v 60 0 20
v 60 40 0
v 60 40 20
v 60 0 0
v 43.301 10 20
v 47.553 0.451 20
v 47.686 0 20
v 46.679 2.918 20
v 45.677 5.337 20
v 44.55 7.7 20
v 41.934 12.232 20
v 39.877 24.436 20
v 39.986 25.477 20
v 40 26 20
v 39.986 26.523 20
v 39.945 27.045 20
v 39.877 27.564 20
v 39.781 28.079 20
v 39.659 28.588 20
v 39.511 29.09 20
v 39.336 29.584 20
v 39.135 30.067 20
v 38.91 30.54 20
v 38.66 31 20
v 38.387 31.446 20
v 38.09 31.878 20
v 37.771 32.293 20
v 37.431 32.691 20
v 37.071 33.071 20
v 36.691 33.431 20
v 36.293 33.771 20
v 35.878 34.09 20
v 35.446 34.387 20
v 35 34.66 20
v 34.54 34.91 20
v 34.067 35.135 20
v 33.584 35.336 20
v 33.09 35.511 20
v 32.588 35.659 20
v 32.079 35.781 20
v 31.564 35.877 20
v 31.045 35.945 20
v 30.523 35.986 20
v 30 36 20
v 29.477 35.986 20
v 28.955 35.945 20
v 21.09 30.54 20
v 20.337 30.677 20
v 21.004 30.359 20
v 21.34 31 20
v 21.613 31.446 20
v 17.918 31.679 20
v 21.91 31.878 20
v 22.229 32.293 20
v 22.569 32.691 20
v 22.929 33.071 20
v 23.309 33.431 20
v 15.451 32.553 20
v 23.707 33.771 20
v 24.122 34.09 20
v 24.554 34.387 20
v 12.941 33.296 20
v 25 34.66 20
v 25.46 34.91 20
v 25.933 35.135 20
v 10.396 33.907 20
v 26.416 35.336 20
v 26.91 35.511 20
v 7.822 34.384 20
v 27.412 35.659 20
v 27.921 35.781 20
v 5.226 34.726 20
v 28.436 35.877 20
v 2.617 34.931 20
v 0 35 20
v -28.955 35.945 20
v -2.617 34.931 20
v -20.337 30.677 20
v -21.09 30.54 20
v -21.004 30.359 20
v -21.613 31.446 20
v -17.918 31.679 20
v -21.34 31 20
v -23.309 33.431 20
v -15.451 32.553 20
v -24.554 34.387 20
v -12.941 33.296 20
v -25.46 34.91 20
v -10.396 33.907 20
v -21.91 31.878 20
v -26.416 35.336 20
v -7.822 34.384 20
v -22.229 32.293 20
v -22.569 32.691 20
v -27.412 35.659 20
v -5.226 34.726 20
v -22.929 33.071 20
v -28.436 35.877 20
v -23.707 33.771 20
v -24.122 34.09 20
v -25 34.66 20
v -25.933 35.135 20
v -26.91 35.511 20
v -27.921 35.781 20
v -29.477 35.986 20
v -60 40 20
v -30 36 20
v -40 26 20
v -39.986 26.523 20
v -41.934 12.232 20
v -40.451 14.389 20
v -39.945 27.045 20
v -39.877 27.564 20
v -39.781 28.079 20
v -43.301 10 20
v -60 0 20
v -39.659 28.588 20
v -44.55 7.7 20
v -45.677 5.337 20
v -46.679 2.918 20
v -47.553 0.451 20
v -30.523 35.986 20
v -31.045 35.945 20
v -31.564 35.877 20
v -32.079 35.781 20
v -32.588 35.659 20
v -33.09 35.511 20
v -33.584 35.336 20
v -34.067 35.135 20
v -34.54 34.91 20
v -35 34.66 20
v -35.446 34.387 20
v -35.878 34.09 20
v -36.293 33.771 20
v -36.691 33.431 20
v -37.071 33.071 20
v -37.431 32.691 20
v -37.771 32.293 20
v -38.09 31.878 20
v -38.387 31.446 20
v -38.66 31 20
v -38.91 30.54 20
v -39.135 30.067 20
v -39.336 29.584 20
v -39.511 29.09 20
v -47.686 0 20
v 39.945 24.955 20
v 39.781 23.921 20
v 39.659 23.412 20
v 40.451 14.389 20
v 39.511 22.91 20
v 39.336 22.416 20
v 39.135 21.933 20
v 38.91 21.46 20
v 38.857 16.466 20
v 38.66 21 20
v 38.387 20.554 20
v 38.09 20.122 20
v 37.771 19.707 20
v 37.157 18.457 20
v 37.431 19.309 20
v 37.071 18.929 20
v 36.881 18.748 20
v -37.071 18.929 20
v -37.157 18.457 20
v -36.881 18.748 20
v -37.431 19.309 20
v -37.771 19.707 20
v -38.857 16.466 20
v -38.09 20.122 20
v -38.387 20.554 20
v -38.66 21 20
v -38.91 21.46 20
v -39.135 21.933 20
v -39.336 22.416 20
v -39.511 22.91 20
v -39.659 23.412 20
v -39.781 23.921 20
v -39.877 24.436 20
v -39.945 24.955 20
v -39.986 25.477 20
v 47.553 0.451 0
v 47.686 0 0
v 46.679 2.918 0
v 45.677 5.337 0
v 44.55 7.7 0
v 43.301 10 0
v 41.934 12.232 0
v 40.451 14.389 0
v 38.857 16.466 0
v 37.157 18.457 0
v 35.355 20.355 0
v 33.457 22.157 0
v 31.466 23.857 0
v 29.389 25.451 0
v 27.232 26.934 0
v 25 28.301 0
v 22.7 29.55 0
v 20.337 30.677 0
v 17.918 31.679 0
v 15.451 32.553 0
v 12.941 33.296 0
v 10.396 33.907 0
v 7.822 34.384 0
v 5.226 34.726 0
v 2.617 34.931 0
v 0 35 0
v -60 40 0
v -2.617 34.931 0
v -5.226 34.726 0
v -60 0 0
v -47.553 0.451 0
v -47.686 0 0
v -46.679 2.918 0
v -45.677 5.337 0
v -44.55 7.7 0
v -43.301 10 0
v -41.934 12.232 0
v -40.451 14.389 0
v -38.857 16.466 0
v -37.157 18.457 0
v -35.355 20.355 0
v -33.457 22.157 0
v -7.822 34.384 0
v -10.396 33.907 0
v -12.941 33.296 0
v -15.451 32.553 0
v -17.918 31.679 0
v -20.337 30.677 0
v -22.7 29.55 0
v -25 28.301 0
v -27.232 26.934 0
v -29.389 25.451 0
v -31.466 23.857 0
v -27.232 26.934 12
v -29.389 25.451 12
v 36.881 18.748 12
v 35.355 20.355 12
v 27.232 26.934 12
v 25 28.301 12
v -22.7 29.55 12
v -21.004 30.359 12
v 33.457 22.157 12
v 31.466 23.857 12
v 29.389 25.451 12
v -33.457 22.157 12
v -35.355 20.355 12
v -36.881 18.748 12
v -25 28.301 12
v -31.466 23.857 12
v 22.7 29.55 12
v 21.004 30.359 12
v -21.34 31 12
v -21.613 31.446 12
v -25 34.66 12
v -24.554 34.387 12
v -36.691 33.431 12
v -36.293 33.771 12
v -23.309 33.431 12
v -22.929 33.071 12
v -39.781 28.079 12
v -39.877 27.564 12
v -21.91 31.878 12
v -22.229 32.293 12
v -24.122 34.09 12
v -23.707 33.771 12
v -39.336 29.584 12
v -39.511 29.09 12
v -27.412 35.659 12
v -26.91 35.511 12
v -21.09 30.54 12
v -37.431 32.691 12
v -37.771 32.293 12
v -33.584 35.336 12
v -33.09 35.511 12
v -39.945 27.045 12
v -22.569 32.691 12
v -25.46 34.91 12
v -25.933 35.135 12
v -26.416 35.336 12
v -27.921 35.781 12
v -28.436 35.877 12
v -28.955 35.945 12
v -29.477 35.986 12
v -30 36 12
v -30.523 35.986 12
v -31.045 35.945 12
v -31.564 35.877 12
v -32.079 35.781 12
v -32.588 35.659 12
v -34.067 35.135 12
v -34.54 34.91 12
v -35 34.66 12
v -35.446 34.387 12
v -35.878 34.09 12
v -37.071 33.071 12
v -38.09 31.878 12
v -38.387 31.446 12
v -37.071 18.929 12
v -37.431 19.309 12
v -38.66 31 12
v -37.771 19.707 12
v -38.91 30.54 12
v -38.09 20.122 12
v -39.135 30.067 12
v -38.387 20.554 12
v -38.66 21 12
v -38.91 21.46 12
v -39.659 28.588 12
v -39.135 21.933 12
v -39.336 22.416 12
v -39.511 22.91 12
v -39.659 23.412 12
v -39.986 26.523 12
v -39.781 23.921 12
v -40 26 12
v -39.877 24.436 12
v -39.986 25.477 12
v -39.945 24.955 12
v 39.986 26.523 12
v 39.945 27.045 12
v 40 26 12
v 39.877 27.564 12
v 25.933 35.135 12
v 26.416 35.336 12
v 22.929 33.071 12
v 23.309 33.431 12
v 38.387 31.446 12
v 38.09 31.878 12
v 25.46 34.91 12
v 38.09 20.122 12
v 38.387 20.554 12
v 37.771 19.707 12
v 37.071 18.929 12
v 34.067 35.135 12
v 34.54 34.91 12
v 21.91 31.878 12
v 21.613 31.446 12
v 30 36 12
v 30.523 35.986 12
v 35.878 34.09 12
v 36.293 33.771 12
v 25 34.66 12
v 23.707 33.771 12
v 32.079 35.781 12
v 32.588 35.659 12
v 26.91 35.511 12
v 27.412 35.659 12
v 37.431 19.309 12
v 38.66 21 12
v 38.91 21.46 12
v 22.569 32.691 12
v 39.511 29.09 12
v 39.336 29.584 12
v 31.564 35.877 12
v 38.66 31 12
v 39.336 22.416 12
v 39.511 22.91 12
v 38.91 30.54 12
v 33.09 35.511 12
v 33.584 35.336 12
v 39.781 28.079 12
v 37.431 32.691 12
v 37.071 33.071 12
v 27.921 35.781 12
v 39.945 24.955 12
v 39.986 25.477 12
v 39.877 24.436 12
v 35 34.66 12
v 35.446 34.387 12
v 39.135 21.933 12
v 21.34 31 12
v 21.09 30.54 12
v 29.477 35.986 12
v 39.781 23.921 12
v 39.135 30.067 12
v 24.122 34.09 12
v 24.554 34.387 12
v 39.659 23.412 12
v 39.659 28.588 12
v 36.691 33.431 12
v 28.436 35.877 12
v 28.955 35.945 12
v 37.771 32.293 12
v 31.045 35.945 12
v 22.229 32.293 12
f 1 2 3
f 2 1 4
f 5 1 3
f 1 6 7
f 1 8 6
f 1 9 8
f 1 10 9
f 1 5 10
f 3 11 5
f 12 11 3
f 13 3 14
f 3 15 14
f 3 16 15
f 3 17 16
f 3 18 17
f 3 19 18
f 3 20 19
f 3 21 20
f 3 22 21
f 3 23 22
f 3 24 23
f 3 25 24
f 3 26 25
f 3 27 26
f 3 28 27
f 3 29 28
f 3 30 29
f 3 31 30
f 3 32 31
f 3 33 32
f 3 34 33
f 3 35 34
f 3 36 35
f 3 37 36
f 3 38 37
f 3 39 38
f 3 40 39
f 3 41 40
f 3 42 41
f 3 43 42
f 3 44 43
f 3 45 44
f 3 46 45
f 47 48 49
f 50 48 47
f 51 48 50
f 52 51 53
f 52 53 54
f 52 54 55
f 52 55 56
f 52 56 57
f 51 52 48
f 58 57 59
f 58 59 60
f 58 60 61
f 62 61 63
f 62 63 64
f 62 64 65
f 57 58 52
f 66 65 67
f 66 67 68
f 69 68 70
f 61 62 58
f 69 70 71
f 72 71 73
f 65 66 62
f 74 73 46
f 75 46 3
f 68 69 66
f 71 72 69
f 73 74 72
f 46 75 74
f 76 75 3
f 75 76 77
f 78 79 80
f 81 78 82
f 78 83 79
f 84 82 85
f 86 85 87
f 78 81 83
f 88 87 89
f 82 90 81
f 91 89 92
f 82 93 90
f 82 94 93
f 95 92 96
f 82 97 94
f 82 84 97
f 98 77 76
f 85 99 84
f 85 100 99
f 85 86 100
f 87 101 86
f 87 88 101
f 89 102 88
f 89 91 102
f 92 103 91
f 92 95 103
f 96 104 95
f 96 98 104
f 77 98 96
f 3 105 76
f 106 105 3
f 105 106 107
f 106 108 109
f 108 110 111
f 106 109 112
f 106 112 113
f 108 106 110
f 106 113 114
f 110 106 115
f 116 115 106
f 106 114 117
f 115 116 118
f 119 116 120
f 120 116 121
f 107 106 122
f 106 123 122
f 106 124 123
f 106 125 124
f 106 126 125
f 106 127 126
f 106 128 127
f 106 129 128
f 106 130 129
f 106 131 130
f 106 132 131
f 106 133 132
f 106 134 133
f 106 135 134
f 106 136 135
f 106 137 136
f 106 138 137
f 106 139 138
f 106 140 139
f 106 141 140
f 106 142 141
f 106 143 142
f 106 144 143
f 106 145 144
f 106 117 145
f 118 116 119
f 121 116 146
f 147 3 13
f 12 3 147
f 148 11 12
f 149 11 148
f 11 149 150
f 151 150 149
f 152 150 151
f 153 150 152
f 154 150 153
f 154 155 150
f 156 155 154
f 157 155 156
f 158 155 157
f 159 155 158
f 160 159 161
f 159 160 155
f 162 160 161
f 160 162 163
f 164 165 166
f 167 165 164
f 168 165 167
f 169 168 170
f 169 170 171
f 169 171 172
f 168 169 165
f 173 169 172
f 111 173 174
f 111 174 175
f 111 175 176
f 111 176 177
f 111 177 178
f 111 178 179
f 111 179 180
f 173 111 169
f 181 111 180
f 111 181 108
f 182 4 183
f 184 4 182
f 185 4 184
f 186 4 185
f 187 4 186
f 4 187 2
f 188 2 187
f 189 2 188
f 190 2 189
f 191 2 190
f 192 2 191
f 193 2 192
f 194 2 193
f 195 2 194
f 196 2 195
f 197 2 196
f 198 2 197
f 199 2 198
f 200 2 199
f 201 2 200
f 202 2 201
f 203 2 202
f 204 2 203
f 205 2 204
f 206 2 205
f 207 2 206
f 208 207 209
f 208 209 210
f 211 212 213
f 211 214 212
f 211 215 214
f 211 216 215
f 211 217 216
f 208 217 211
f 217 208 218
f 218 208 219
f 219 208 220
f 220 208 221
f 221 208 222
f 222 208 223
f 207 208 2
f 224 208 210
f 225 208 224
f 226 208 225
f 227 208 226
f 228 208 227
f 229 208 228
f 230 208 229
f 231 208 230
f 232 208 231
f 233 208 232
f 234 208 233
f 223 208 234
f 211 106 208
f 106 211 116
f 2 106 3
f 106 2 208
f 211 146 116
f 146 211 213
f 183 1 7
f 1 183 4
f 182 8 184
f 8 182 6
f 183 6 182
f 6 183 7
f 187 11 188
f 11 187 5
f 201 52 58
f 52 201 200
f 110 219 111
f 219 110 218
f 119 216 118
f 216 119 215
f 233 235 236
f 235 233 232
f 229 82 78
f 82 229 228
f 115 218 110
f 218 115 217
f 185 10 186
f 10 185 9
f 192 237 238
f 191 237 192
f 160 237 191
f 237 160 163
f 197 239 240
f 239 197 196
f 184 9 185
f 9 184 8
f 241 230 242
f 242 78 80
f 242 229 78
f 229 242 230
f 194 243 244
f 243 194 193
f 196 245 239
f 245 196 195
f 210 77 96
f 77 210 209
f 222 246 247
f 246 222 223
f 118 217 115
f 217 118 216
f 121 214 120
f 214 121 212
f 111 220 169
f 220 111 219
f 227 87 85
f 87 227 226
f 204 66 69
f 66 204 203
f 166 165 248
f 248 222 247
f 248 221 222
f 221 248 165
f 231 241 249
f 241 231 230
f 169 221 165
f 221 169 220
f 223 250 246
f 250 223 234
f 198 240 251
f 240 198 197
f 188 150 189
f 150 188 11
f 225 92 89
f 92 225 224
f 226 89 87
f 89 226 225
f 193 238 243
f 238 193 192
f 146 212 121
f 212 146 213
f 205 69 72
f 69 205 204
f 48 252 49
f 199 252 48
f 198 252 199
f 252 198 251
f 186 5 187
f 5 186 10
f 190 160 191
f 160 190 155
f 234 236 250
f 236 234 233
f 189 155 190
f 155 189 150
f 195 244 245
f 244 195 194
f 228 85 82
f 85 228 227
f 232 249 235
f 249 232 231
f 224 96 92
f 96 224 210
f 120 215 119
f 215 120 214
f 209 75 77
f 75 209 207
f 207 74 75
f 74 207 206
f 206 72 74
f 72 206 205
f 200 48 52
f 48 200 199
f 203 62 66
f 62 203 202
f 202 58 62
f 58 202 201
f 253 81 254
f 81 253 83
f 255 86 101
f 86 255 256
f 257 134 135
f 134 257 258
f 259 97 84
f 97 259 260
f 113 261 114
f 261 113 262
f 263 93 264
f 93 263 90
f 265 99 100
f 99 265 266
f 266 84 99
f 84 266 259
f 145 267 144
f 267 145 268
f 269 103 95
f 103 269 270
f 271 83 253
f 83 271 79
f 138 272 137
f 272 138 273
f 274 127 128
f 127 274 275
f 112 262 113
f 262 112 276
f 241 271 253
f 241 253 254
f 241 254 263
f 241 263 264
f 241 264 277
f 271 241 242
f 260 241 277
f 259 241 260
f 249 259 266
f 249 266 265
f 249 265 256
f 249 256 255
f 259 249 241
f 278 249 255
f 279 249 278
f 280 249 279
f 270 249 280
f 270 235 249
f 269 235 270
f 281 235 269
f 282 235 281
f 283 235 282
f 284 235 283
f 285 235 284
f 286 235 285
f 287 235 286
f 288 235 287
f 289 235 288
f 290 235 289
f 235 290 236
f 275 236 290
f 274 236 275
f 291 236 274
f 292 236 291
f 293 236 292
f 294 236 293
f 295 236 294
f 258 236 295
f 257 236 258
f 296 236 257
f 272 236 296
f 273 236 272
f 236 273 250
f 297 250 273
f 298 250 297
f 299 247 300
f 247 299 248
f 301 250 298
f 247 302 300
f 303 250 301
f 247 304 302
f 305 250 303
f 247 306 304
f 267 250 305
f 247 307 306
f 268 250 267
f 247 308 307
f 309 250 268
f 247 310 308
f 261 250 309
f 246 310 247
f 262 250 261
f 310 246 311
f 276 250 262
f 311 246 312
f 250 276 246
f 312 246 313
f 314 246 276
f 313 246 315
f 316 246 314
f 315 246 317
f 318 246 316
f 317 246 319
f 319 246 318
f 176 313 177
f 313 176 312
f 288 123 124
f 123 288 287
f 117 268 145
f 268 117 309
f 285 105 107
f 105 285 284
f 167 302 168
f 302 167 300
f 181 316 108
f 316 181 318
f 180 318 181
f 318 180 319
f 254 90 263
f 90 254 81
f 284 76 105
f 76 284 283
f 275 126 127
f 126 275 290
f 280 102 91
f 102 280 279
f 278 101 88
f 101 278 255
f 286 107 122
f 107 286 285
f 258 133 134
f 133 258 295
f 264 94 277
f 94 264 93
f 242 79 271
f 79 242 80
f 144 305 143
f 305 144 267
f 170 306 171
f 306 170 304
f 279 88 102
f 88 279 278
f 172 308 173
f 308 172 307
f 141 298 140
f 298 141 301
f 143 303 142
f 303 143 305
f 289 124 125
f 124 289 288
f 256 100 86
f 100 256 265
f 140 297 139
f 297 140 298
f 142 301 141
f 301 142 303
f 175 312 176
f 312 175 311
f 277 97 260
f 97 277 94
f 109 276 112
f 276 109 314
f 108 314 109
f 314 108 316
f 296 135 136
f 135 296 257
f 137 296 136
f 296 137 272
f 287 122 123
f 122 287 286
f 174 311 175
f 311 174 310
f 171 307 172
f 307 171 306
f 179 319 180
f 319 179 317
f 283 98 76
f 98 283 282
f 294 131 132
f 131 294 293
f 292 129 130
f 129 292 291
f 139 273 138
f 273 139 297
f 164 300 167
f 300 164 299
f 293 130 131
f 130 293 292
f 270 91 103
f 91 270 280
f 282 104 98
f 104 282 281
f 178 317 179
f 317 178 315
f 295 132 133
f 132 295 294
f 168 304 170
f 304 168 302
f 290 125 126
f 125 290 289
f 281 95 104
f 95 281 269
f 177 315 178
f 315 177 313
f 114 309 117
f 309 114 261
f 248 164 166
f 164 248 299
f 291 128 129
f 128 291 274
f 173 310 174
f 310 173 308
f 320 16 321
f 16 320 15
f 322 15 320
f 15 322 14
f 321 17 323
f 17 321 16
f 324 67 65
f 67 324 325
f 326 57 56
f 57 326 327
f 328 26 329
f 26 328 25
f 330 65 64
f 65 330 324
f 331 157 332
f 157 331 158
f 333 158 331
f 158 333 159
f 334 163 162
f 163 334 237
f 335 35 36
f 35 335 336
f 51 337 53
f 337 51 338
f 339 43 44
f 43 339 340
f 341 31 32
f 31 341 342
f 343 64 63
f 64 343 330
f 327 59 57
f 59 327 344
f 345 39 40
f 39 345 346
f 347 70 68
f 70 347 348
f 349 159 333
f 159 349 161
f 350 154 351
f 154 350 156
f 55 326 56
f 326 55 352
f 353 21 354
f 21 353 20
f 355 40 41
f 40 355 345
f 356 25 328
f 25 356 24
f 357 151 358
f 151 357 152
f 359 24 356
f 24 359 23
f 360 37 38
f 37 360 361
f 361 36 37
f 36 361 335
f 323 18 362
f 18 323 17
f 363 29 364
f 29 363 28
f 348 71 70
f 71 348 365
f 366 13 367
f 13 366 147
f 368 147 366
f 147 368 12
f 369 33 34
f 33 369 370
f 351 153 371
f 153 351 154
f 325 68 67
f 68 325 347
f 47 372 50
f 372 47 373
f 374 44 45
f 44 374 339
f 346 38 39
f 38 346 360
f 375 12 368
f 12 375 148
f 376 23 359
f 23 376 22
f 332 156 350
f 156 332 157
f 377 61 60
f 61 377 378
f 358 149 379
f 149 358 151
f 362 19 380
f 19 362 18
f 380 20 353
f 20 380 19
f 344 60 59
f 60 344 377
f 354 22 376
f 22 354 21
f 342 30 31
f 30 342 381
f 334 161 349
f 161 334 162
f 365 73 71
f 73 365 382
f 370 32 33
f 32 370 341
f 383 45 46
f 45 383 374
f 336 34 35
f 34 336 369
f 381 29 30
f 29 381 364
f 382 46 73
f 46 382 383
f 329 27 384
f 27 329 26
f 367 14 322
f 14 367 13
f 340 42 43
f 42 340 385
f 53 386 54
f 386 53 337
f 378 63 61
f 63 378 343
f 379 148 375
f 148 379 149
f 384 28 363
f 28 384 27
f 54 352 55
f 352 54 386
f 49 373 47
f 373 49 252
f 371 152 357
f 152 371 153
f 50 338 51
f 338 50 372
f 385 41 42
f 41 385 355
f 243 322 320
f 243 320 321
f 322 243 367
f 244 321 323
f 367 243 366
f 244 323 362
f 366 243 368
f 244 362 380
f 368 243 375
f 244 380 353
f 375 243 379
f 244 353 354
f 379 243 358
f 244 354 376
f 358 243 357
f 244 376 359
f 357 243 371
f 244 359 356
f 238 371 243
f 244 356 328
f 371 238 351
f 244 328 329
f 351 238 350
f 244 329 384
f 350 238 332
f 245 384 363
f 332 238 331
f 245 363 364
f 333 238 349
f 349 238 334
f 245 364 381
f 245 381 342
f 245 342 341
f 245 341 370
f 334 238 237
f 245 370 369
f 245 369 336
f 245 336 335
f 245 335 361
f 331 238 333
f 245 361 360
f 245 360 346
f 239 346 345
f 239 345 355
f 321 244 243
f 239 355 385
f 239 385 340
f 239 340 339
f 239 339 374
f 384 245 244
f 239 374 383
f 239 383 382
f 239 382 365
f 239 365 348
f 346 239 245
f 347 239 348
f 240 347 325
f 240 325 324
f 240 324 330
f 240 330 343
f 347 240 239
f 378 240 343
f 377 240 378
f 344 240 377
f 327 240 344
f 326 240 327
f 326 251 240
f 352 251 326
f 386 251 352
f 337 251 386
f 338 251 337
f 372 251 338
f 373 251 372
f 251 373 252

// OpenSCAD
// Parametric dimensions for the arched bridge model
part_length = 120;         // Total length of the main body
part_height = 40;          // Total height of the main body
part_depth = 20;           // Thickness (extrusion depth) of the main body

arch_radius = 50;          // Radius of the lower arched void
arch_y_offset = -15;       // Vertical drop of the arch center to leave straight vertical ends

recess_radius = 10;        // Radius of the circular material removals
recess_depth = 8;          // Depth of the recesses (shallower than part_depth)
recess_spacing = 60;       // Center-to-center distance between the paired recesses
recess_y_pos = 26;         // Vertical position of the recesses (upper side of the body)

$fn = 120;                 // High resolution for smooth curved surfaces

// Module defining the main extrusion profile with the bottom arch
module arched_body(len, hgt, dpth, a_rad, a_y_off) {
    difference() {
        // Main solid slab
        // Centered on the X axis, resting on Y=0, starting at Z=0
        translate([-len / 2, 0, 0])
            cube([len, hgt, dpth]);
        
        // Subtractive arch for the lower outline
        // Extended in Z to ensure manifold subtraction without Z-fighting
        translate([0, a_y_off, -1])
            cylinder(h=dpth + 2, r=a_rad);
    }
}

// Module defining the paired circular recesses
module paired_recesses(r_spacing, r_y, r_rad, r_depth, z_start) {
    // Left circular recess
    translate([-r_spacing / 2, r_y, z_start - r_depth])
        cylinder(h=r_depth + 1, r=r_rad);
        
    // Right circular recess
    translate([r_spacing / 2, r_y, z_start - r_depth])
        cylinder(h=r_depth + 1, r=r_rad);
}

// Main Assembly
// Subtract the shallower recesses from the arched main body to create a stepped depth
difference() {
    // Base solid shape
    arched_body(part_length, part_height, part_depth, arch_radius, arch_y_offset);
    
    // Material removal pattern on the front face (+Z side)
    paired_recesses(recess_spacing, recess_y_pos, recess_radius, recess_depth, part_depth);
}
